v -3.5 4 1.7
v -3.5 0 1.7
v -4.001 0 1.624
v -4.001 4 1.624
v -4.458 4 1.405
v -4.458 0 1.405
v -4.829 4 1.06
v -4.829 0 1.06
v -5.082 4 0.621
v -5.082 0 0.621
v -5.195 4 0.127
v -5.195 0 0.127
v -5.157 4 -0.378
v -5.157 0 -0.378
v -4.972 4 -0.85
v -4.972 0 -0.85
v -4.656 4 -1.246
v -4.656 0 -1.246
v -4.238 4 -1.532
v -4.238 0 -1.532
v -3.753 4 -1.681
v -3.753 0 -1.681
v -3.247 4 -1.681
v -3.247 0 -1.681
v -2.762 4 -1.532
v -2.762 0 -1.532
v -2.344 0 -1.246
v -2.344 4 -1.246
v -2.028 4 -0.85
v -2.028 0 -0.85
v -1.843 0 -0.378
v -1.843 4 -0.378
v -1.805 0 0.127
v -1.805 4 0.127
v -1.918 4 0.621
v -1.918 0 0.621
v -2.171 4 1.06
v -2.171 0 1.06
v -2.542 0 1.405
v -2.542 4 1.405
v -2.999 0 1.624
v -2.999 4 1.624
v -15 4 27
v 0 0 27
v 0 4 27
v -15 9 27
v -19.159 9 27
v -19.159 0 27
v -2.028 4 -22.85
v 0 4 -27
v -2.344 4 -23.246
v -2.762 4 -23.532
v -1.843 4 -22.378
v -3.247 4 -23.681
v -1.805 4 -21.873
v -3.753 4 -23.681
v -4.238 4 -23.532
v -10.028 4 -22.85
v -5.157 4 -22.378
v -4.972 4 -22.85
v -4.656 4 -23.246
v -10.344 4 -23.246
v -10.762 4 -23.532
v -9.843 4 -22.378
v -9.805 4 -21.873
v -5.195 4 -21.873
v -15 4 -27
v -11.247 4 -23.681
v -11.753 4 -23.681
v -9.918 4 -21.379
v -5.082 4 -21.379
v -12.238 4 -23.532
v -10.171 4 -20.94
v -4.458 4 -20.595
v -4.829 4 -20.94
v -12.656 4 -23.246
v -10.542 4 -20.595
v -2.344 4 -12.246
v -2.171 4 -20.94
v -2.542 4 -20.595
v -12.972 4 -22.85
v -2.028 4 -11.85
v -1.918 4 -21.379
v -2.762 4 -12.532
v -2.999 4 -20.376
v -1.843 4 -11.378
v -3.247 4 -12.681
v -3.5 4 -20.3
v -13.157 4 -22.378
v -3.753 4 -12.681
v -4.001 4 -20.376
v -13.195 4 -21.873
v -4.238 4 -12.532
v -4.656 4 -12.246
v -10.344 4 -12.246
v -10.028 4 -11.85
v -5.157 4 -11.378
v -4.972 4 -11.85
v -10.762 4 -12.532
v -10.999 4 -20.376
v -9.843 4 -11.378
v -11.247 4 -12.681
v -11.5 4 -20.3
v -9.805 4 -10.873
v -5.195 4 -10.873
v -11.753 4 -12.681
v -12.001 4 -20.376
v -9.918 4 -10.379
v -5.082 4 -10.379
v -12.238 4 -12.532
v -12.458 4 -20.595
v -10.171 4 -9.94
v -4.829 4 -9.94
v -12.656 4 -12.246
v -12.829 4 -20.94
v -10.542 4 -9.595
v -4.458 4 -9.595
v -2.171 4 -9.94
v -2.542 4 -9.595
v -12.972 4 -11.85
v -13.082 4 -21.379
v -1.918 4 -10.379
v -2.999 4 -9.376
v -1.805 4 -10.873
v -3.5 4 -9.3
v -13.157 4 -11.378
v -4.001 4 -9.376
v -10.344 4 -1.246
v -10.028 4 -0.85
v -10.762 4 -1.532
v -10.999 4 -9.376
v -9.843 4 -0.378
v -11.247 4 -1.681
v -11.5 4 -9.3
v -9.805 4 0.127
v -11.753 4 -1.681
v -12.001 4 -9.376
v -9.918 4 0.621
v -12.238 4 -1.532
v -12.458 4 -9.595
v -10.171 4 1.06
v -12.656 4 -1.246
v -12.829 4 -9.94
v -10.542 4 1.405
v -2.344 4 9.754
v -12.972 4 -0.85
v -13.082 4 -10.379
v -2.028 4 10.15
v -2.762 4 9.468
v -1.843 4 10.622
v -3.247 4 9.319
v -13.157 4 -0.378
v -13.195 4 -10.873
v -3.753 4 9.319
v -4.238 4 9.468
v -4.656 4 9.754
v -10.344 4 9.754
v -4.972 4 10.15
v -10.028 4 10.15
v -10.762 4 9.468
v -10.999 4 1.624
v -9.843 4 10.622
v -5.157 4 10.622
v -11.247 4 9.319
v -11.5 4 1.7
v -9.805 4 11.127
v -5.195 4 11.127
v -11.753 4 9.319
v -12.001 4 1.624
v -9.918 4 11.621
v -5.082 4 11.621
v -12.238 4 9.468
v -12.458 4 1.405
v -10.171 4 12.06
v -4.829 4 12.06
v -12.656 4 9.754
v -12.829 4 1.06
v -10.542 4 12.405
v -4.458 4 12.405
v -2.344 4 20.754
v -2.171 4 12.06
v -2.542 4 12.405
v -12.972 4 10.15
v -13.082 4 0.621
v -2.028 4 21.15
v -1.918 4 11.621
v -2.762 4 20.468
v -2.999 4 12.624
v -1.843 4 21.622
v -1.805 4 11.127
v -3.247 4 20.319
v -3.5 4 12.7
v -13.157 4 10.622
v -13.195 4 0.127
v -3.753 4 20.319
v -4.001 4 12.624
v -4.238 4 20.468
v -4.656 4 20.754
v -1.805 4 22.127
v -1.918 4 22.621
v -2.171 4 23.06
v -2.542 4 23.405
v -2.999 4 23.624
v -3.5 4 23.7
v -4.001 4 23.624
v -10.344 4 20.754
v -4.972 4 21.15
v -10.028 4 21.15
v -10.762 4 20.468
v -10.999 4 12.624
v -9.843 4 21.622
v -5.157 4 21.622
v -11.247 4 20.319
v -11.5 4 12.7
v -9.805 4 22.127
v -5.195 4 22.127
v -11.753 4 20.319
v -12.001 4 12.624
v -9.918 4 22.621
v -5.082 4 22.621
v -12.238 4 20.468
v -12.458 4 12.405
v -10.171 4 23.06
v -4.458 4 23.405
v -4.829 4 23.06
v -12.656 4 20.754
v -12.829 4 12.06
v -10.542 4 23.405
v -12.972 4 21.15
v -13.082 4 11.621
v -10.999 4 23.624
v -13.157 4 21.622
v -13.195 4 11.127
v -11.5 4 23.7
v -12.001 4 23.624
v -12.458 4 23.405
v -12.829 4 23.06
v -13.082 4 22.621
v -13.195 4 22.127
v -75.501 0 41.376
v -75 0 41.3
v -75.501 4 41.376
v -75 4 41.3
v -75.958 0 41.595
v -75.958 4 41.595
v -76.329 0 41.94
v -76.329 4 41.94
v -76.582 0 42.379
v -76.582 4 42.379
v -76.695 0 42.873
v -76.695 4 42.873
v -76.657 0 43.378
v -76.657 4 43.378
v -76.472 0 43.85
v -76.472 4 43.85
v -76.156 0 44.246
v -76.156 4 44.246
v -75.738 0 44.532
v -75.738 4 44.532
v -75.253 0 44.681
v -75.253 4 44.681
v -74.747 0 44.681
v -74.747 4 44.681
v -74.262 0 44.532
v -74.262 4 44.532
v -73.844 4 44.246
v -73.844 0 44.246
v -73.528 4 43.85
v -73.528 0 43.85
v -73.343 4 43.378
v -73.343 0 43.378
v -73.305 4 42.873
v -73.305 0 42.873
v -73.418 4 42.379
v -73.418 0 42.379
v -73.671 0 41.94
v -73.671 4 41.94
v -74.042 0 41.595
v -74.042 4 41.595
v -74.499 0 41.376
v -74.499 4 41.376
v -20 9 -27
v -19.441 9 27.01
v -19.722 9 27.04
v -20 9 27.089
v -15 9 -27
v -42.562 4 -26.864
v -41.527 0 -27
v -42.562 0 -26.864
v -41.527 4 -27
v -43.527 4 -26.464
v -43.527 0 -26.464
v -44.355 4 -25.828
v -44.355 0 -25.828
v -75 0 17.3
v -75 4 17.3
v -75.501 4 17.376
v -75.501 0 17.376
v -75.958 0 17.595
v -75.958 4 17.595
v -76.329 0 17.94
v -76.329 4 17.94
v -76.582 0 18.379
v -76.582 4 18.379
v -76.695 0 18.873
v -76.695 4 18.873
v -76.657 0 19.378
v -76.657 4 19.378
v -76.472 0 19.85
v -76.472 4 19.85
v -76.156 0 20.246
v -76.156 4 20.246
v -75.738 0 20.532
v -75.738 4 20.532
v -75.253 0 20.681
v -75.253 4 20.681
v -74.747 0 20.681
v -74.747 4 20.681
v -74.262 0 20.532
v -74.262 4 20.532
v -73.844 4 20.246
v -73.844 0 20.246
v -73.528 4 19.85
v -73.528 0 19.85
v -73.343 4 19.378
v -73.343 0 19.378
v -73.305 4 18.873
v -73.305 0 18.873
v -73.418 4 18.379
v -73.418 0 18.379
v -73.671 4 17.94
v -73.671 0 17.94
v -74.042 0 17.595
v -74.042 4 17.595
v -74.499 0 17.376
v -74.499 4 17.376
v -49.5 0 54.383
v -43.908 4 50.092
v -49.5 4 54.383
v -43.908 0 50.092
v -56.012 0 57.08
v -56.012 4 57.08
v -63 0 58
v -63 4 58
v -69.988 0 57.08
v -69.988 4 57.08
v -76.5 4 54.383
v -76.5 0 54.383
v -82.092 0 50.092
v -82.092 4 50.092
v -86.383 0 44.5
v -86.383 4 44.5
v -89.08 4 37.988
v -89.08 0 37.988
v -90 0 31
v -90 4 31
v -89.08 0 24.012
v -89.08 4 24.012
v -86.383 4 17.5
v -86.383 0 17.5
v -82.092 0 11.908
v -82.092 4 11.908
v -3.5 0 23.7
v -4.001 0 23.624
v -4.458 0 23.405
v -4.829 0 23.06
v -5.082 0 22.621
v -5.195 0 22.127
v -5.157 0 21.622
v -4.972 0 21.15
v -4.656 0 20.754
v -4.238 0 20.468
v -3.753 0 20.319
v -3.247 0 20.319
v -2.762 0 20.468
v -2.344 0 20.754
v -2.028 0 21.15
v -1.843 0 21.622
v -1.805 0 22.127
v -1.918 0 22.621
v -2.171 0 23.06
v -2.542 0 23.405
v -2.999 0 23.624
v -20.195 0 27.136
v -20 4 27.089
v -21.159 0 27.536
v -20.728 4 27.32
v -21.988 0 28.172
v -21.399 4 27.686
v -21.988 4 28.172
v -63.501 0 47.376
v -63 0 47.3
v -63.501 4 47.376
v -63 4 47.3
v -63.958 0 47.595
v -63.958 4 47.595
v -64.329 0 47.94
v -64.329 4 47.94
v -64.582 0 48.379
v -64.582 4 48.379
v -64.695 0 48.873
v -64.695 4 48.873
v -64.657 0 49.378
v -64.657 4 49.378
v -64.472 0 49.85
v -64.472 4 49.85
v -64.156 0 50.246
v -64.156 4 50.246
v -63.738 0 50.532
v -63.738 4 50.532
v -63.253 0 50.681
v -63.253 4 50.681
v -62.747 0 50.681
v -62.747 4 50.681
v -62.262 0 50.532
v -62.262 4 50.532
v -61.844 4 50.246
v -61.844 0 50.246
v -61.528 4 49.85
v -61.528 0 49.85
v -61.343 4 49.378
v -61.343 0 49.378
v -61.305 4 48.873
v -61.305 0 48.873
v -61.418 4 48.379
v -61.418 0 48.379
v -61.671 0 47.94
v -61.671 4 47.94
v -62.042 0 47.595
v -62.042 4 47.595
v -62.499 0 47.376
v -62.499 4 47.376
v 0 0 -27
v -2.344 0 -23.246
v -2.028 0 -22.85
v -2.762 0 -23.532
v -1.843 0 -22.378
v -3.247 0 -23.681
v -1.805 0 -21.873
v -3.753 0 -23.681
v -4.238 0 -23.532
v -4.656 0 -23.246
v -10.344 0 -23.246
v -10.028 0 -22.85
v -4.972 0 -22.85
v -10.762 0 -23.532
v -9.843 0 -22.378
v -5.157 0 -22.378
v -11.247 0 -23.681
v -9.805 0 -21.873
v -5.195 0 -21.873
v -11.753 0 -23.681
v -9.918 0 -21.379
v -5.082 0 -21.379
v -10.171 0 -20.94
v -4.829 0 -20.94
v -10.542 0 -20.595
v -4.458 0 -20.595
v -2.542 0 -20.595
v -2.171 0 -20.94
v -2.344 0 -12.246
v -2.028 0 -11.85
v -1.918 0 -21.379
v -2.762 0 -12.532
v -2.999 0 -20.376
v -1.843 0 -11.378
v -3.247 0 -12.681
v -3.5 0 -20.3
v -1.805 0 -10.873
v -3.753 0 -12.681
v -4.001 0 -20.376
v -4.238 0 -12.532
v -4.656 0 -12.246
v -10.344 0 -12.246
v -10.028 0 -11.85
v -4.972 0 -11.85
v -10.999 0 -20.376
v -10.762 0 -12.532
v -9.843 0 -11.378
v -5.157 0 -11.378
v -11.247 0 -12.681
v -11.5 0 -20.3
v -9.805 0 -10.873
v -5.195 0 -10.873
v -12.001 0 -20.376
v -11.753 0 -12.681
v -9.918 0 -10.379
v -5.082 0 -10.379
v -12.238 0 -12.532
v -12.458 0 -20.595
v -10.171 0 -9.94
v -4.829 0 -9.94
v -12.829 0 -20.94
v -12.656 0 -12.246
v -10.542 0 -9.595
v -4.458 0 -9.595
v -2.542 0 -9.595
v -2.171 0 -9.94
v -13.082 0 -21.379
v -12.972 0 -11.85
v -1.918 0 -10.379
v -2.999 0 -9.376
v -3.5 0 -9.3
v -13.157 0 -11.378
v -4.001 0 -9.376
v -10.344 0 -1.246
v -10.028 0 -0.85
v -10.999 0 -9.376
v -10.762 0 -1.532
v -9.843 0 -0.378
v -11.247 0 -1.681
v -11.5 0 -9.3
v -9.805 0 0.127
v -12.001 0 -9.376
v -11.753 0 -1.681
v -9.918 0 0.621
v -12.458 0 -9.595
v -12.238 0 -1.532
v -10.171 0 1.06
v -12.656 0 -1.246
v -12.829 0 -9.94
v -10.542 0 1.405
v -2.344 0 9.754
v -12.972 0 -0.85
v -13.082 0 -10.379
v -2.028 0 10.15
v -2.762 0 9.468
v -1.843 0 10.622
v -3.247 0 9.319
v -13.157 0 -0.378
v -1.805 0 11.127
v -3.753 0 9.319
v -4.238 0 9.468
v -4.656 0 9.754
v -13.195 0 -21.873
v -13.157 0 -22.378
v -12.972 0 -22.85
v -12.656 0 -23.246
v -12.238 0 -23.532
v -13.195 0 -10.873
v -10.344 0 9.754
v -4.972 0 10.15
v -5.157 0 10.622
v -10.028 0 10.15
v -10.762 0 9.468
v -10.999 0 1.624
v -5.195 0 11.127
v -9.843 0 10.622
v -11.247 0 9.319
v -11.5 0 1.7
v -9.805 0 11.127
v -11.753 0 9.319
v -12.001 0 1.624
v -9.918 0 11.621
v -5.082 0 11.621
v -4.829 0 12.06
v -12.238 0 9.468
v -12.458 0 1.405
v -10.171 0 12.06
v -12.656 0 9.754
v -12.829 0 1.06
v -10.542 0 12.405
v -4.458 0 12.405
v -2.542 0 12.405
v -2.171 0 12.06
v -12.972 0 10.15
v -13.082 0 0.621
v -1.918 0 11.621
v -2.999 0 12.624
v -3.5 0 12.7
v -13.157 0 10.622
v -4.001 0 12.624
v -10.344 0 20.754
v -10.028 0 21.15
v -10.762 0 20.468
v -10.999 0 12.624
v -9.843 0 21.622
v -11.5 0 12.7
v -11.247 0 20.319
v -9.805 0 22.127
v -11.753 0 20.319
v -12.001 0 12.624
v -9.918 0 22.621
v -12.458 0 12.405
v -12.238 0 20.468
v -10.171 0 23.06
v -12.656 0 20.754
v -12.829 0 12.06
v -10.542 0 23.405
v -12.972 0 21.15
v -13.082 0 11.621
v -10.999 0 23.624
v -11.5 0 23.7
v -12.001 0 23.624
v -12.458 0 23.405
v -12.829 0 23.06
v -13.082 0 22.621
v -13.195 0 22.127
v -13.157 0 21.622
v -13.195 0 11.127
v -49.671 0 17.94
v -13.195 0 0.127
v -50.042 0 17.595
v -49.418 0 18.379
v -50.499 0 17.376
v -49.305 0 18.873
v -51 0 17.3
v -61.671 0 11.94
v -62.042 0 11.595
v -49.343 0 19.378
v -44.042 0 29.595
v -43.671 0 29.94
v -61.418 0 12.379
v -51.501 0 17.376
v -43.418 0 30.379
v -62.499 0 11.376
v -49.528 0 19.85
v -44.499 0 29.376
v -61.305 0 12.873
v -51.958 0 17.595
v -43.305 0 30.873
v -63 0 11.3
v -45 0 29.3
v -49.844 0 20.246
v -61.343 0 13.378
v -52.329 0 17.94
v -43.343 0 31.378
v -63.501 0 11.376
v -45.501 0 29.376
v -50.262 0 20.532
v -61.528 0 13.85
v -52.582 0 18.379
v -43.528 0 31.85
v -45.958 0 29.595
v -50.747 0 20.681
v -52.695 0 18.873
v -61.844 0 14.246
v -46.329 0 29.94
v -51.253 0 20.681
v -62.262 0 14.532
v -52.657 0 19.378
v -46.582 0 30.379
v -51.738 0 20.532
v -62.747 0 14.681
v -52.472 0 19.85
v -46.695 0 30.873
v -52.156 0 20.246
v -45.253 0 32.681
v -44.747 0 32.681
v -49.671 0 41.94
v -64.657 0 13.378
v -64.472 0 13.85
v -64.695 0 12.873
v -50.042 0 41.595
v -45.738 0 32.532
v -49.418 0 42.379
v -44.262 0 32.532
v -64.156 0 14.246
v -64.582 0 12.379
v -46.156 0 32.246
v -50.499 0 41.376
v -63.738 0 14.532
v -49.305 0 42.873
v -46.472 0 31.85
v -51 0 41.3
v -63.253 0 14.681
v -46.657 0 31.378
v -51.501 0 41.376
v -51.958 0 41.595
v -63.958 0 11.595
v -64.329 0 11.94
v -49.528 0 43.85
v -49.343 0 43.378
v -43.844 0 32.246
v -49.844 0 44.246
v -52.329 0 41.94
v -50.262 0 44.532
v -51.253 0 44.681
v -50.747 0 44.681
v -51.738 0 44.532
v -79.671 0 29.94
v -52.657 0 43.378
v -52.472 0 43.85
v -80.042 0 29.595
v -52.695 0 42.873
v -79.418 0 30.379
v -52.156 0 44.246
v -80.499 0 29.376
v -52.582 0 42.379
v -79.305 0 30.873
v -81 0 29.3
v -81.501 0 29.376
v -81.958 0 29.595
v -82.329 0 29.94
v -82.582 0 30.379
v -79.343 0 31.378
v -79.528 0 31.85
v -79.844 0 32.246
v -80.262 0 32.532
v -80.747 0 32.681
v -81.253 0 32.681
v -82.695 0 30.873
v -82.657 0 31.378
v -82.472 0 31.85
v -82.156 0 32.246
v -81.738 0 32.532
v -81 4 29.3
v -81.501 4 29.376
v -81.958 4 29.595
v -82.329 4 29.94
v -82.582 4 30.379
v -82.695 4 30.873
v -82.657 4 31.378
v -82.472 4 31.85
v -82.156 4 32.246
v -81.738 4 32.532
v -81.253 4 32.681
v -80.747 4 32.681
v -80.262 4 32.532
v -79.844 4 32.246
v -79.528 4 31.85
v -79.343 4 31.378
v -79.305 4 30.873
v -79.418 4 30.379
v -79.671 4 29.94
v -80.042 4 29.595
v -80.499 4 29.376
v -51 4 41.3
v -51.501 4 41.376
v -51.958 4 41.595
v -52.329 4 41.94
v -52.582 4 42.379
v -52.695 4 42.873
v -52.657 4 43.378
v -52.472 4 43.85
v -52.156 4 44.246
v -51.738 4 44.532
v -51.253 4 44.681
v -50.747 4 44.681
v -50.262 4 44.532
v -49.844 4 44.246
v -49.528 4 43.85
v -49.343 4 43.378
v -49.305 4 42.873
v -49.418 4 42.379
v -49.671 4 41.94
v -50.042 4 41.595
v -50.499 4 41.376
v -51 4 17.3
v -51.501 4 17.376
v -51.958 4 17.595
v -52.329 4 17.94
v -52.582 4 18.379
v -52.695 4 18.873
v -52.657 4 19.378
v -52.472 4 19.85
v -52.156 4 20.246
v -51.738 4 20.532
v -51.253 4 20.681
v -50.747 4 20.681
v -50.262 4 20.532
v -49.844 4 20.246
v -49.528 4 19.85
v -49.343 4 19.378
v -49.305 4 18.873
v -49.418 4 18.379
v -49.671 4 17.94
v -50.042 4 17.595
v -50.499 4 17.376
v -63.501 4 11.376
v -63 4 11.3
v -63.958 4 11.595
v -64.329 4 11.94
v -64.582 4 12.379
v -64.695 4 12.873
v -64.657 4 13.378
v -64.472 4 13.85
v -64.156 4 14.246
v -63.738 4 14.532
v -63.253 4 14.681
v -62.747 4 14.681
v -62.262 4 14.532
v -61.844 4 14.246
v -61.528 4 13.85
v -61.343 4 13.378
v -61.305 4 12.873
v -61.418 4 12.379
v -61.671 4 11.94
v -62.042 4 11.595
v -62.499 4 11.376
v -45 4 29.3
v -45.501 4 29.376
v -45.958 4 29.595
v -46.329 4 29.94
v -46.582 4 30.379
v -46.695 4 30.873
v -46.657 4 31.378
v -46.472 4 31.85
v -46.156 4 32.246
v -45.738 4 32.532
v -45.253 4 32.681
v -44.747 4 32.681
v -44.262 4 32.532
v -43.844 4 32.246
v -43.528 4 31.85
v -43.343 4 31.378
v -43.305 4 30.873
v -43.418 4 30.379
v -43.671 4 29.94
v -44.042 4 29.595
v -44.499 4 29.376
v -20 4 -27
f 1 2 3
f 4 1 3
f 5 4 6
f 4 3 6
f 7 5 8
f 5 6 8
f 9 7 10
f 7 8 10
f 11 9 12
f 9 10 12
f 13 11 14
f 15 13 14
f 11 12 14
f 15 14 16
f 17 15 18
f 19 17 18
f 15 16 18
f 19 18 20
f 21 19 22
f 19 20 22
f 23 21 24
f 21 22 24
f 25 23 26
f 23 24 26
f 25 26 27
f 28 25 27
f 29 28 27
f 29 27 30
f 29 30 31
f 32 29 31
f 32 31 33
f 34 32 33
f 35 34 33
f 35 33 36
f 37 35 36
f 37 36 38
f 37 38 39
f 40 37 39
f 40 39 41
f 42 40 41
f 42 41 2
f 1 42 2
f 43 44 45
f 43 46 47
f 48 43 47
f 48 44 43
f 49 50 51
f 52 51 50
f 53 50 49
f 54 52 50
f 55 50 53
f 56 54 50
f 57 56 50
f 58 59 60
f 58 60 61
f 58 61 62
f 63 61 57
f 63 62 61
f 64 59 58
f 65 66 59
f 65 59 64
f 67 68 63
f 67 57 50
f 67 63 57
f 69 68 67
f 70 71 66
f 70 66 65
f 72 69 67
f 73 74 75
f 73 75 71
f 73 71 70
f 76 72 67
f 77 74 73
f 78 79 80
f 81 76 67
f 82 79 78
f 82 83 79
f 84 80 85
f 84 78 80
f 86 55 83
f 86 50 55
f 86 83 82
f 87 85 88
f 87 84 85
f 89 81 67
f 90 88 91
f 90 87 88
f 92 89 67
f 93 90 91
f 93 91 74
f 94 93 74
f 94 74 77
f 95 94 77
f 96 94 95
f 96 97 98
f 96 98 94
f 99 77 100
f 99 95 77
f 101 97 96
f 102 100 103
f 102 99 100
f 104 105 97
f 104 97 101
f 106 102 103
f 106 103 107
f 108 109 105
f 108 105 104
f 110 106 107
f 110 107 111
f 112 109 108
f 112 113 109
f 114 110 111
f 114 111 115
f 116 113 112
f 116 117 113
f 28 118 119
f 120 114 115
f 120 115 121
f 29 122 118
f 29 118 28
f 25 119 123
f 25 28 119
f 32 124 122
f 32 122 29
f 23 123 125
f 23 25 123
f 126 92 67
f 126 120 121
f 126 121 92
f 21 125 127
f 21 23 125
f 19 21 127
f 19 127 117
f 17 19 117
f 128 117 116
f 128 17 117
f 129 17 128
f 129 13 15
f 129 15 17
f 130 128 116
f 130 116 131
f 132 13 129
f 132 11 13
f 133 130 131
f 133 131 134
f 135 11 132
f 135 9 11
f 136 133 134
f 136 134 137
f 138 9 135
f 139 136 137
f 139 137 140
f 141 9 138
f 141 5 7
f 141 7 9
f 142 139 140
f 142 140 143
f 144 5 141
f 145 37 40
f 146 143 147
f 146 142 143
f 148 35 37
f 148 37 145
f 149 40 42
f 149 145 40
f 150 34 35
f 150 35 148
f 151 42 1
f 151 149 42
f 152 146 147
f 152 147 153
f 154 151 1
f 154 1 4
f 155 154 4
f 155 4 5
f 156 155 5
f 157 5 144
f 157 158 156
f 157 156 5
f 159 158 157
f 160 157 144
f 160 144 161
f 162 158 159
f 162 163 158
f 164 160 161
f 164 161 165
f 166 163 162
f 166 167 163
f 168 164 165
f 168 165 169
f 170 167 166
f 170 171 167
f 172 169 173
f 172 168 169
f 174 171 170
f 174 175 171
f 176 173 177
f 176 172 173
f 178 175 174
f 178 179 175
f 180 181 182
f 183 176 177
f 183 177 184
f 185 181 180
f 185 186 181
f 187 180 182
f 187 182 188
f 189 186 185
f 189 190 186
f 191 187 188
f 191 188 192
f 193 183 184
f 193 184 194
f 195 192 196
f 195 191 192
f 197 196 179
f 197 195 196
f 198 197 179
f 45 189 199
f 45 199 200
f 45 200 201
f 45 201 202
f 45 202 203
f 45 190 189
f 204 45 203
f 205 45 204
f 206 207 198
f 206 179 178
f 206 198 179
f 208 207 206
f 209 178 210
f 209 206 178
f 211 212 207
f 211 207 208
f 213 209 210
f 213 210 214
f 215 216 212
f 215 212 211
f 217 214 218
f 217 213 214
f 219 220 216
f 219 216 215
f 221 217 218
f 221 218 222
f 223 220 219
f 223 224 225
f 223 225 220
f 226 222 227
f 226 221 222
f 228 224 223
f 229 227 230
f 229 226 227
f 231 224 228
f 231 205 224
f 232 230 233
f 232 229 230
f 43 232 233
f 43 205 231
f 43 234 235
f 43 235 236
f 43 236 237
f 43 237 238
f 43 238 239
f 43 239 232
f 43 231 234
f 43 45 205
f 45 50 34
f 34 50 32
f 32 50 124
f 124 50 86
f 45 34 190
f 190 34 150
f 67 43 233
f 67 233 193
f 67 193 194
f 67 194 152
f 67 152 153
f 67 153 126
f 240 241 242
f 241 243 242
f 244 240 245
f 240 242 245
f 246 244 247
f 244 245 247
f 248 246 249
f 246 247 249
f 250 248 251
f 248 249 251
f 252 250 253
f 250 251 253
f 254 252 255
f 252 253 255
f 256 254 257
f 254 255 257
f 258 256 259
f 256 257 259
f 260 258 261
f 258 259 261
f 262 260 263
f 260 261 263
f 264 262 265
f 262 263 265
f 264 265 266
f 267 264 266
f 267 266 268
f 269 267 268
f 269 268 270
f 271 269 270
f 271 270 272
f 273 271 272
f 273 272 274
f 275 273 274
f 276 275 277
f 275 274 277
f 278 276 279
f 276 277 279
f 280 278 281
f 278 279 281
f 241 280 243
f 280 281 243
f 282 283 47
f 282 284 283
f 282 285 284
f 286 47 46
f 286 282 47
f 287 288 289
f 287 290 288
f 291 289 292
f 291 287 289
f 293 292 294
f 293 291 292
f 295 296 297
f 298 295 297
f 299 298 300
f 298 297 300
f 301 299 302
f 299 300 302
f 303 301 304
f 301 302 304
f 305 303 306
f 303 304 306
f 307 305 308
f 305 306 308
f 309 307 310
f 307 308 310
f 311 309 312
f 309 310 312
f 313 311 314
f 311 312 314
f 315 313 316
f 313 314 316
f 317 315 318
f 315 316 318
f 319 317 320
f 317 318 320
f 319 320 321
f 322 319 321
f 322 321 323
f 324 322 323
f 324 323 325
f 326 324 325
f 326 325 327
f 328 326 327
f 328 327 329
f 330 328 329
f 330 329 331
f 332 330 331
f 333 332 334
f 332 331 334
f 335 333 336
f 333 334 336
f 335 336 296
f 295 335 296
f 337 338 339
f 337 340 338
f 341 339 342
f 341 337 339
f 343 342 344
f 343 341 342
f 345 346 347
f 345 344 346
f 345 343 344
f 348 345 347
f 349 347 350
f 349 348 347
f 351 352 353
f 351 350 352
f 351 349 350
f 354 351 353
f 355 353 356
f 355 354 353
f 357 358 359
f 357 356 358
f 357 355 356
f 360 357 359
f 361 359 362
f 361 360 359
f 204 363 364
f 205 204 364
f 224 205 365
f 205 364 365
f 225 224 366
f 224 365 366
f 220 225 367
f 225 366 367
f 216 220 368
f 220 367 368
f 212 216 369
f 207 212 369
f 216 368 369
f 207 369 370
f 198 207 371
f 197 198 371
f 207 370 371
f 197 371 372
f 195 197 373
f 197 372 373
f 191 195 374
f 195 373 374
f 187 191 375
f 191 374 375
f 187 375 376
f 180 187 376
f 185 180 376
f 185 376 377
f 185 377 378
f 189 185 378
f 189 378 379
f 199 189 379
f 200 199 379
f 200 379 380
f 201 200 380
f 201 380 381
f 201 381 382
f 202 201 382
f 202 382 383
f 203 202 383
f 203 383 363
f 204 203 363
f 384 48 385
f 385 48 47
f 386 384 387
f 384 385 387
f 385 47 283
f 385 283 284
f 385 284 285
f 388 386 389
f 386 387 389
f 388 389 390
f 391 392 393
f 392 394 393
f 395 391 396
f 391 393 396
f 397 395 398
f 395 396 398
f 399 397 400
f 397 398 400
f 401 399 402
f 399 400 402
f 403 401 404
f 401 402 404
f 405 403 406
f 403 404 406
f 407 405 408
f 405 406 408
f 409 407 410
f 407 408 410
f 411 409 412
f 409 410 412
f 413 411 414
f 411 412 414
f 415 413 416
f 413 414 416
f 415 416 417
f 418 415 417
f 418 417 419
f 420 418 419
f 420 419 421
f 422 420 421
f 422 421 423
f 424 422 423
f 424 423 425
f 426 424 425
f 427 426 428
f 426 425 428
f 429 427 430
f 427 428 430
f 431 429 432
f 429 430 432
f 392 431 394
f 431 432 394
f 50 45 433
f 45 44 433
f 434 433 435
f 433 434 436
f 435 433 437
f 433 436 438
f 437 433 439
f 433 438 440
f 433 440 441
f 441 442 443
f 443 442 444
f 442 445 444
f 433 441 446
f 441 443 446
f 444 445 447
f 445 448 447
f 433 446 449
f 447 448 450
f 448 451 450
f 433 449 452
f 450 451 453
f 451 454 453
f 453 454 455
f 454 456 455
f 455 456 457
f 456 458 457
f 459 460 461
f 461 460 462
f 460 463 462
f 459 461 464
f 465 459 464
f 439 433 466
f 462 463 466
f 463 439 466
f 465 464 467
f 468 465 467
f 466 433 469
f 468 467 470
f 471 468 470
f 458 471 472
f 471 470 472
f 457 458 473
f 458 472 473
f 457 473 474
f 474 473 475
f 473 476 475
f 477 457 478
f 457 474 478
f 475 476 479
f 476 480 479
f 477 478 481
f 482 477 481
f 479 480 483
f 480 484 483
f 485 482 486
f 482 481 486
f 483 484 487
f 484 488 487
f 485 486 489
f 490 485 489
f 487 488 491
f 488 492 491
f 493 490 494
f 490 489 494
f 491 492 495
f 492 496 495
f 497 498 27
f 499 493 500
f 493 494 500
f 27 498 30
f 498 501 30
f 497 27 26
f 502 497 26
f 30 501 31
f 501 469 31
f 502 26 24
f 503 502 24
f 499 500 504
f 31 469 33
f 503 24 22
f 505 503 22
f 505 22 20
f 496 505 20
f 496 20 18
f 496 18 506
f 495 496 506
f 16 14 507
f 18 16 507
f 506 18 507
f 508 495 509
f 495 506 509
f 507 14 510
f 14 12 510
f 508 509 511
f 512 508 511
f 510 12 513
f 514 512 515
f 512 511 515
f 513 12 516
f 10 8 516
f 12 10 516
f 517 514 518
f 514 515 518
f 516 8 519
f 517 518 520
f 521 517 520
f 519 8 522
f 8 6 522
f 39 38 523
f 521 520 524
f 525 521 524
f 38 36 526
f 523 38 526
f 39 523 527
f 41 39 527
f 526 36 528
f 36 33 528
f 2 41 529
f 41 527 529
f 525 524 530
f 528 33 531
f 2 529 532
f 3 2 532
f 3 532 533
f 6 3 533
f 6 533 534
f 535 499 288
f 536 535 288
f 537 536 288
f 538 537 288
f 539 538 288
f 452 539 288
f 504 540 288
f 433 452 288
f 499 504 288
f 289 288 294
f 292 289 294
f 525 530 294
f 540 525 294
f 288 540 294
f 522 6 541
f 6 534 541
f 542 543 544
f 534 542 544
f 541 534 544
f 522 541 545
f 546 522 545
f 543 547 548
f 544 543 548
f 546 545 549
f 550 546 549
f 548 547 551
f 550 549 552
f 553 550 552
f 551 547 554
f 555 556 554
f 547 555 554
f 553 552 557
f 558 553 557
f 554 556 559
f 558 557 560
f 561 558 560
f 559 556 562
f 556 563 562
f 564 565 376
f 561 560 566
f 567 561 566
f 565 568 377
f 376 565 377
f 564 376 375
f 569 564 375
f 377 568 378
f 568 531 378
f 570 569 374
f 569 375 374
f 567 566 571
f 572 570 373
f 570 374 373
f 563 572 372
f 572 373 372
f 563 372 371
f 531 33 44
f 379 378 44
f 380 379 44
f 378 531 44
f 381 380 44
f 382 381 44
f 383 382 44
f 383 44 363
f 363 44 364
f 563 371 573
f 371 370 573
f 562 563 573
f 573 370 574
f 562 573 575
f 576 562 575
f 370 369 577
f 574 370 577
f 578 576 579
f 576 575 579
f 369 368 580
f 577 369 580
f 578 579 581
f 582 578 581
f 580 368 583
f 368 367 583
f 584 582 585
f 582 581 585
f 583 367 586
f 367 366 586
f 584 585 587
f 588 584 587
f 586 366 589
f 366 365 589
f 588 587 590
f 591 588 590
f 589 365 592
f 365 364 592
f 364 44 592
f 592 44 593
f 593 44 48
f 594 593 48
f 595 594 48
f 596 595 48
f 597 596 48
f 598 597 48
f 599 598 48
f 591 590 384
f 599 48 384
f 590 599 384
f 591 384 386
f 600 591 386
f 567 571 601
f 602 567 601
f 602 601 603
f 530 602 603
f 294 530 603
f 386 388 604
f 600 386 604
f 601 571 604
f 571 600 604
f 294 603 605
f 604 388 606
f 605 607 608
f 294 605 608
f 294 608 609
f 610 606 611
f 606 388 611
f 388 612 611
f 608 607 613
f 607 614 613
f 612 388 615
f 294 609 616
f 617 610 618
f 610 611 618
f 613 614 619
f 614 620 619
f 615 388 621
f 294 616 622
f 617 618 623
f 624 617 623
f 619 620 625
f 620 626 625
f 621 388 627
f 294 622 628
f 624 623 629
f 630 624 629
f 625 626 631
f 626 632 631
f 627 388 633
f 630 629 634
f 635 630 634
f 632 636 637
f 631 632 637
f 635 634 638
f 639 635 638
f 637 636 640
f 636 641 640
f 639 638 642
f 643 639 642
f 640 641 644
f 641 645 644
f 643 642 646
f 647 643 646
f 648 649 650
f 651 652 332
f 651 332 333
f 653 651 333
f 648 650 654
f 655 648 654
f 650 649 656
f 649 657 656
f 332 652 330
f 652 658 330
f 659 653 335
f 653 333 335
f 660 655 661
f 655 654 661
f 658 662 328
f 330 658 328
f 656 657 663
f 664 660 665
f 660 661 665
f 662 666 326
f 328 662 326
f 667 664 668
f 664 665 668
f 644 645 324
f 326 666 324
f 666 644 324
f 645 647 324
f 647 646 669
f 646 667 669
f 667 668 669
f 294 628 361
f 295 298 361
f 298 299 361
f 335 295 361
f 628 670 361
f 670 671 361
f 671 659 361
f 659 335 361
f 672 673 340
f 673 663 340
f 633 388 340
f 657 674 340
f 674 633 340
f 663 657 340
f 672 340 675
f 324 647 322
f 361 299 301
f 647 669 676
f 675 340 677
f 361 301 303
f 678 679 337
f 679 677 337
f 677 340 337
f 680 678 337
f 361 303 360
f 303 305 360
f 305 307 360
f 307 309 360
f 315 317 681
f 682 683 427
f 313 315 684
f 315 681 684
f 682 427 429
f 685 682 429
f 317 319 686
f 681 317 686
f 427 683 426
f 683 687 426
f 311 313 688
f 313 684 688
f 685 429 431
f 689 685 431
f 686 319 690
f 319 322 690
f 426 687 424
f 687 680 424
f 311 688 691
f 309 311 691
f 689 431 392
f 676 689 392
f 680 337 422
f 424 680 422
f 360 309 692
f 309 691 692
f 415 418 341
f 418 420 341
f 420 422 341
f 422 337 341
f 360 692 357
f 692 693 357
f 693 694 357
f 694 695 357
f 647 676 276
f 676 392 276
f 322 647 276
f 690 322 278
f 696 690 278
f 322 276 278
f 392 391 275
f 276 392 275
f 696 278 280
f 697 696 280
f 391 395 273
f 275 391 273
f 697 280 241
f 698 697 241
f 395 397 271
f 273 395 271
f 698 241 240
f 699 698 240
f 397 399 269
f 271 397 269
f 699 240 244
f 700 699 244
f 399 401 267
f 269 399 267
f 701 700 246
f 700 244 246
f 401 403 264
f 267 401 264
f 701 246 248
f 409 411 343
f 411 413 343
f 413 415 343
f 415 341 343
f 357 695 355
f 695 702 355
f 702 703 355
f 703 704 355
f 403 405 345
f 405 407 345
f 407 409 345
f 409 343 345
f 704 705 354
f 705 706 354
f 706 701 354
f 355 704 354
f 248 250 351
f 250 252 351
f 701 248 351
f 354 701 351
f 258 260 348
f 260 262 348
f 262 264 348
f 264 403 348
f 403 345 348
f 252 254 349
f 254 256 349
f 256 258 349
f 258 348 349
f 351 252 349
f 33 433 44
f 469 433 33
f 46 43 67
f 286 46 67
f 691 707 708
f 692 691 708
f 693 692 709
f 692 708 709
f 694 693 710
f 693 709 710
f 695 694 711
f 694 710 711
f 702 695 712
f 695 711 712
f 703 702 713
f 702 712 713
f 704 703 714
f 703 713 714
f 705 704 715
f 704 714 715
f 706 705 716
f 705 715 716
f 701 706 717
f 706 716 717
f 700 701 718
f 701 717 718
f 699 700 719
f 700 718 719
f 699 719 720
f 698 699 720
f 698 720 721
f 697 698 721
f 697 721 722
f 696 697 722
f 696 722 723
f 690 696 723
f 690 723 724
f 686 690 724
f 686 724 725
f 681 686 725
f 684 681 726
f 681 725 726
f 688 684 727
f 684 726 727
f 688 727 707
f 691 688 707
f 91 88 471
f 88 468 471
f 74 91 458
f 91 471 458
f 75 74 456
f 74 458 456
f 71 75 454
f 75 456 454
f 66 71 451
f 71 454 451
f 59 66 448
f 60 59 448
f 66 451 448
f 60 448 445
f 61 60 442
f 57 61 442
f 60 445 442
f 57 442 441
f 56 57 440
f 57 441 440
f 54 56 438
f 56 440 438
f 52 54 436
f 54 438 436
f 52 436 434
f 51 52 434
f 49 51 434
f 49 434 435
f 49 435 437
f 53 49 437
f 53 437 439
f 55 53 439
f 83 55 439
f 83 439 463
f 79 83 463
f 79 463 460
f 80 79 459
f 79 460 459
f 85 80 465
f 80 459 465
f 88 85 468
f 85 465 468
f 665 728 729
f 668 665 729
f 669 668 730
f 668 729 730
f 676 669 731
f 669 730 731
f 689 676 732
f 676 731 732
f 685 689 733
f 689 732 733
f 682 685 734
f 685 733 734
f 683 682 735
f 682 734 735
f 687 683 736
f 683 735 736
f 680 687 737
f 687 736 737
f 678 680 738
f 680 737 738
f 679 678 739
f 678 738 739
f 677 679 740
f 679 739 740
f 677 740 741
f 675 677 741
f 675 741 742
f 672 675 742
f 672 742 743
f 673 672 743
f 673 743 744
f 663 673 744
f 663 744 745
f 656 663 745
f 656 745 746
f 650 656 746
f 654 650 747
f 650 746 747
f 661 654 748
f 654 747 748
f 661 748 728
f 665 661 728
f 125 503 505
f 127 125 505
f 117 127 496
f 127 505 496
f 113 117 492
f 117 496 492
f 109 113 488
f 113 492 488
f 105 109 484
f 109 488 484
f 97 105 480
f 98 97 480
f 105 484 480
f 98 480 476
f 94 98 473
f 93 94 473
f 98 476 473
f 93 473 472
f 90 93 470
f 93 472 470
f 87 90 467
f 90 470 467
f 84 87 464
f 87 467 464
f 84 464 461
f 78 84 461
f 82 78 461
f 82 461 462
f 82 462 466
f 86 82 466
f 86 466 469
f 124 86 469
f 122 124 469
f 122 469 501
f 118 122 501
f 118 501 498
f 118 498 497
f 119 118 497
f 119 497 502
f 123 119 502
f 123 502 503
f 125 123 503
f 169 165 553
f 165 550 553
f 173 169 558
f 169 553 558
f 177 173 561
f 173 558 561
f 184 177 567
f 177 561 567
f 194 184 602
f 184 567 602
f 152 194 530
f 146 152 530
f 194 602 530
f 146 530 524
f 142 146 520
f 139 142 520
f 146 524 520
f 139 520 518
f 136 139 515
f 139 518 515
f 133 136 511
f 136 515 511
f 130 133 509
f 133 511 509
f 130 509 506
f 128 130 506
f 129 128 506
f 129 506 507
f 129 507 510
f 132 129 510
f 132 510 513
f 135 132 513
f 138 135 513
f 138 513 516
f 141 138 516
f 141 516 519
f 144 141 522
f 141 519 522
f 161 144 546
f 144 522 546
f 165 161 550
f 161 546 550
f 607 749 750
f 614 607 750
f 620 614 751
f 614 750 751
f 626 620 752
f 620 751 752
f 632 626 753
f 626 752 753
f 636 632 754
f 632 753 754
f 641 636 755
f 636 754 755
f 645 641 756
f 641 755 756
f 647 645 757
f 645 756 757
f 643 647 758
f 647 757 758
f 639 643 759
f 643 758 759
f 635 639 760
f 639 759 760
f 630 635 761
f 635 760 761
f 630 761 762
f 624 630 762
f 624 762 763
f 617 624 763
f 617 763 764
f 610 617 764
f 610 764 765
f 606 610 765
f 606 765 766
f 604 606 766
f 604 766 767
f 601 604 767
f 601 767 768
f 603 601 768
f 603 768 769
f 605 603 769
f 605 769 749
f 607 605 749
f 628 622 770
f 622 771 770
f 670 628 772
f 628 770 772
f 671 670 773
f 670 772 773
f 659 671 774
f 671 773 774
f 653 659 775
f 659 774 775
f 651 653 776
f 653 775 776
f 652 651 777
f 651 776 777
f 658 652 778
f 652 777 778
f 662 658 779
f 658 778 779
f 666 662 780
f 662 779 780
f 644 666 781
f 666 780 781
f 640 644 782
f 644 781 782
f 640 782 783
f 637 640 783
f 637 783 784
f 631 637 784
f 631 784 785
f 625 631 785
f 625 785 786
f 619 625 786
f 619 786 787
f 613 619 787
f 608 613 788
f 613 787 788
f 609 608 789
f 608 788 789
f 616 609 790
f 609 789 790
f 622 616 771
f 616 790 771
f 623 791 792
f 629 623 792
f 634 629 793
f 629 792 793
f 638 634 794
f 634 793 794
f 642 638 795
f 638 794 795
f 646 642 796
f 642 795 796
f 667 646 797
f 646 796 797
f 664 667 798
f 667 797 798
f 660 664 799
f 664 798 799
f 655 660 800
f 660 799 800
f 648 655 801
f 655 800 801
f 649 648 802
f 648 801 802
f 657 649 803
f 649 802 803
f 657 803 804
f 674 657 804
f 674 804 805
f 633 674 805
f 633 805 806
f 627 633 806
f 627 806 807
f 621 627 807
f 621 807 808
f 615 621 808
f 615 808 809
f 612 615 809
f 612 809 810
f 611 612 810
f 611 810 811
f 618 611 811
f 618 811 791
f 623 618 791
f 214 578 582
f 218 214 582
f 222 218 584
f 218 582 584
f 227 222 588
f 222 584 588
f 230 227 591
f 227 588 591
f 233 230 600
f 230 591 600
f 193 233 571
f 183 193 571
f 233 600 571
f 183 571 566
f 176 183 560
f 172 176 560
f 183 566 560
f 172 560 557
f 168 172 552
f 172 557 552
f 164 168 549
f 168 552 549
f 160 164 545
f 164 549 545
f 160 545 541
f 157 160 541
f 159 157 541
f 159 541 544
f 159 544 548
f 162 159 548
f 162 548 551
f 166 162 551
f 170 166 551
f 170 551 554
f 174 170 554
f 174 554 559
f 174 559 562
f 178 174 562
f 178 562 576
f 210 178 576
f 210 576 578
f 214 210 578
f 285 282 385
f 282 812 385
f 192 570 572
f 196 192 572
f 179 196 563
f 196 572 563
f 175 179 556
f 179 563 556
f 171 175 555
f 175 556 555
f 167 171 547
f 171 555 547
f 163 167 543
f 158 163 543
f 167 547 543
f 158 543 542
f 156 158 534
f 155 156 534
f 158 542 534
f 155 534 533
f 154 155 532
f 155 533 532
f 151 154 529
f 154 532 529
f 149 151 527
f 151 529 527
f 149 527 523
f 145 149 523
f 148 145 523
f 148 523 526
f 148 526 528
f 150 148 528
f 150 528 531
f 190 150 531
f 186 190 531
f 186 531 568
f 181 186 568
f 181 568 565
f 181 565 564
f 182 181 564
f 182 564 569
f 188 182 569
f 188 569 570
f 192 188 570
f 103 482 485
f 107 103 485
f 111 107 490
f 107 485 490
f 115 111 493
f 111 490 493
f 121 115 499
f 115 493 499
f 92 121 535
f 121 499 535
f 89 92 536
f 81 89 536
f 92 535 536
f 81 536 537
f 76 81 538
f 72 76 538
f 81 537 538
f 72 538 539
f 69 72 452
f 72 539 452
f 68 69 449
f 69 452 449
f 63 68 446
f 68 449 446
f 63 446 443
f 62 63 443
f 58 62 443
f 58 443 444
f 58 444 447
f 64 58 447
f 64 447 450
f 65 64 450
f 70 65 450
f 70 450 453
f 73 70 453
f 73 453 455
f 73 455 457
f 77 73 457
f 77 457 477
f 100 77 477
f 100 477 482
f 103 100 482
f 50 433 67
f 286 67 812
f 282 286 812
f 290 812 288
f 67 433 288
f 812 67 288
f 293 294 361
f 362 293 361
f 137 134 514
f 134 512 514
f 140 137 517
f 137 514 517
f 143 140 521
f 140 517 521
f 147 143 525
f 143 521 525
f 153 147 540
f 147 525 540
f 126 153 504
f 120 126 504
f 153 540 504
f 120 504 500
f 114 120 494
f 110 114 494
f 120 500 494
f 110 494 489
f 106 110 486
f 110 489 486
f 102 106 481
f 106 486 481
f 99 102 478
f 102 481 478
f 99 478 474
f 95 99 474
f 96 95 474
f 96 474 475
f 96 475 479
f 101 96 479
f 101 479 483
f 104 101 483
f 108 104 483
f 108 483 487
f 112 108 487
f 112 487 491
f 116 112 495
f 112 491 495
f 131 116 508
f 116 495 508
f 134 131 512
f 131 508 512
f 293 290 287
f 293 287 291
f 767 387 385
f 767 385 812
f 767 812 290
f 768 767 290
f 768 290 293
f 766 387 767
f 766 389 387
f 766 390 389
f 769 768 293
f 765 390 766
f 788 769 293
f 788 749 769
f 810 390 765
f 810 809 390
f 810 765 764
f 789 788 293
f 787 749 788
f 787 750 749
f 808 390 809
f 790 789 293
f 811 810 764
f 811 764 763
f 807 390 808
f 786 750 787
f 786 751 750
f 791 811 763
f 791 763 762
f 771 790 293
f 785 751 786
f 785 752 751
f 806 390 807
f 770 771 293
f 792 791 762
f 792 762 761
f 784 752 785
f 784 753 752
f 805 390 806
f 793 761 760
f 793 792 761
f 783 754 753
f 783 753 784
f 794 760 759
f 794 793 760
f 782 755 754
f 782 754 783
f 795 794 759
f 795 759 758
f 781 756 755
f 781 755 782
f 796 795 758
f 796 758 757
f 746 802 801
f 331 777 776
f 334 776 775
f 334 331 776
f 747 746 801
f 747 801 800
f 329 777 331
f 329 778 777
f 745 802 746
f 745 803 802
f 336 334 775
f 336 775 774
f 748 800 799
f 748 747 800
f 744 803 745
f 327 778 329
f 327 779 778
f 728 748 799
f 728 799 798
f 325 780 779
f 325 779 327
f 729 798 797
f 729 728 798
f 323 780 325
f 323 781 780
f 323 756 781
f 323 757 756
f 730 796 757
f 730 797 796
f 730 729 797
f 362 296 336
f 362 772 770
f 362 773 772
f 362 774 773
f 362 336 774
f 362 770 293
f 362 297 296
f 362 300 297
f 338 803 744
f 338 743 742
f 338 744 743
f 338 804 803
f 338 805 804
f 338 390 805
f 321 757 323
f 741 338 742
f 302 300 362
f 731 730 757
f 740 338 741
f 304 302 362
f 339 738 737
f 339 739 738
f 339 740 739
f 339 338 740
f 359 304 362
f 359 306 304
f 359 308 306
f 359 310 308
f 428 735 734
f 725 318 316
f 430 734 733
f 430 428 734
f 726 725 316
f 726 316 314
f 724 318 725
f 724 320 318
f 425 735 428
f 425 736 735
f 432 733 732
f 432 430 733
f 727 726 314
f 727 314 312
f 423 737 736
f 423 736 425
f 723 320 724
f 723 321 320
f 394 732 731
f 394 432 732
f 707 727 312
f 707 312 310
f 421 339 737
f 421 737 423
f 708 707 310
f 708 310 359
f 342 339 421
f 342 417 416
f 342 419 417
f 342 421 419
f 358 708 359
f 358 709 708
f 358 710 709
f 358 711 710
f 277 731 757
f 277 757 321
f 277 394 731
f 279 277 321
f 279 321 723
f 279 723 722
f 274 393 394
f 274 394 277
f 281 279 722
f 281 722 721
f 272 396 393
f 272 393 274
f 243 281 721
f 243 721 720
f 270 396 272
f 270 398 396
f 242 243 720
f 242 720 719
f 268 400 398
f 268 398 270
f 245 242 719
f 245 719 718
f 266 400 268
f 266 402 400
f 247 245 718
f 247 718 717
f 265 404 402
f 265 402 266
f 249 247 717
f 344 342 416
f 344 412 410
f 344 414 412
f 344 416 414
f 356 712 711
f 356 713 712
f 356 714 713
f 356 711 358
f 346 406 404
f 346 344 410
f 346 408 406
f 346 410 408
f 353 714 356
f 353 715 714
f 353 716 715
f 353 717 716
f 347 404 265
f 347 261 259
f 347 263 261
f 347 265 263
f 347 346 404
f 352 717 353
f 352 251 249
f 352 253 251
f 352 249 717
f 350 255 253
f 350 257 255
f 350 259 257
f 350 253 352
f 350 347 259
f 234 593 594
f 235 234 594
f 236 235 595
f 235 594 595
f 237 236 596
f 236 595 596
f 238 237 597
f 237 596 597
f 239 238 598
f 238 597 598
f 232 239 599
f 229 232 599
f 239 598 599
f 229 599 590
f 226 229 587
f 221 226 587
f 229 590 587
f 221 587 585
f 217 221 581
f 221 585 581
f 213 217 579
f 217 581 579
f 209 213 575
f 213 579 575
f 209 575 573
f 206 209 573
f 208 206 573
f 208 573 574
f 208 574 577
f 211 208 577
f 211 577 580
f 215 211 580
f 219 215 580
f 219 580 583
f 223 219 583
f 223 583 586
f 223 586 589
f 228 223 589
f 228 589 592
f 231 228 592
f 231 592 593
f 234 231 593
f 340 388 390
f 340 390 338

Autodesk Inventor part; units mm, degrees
ref_plane "YZ Plane" through (0, 0, 0) normal (1, 0, 0) x (0, 1, 0)
ref_plane "XZ Plane" through (0, 0, 0) normal (0, 1, 0) x (-1, 0, 0)
ref_plane "XY Plane" through (0, 0, 0) normal (0, 0, 1) x (1, 0, 0)
sketch "Skizze1" plane through (0, 0, 0) normal (0, 1, 0) x (-1, 0, 0)
  line L0 (0, 27) -> (0, -27)
  line L1 (0, 27) -> (20.8162, 27)
  line L2 (20.8162, 27) -> (43.9081, 50.0919)
  line L3 (0, -27) -> (43.1838, -27)
  line L4 (43.1838, -27) -> (82.0919, 11.9081)
  arc A0 (82.0919, 11.9081) -> (43.9081, 50.0919) centre (63, 31) ccw
  point P0 (0, 0)
  point P1 (0, 0)
  dimension "d43" = 54
  dimension "d44" = 135
  dimension "d46" = 31
  dimension "d47" = 63
  dimension "d48" = 54
extrude "Extrusion1" add sketch "Skizze1" along normal blind 4
sketch "Skizze5" plane through (0, 4, 0) normal (0, 1, 0) x (1, 0, 0)
  line L0 (0, -27) -> (0, 27) projected
  line L1 (0, 27) -> (-43.1838, 27) projected
  line L2 (-43.1838, 27) -> (-82.0919, -11.9081) projected
  arc A0 (-82.0919, -11.9081) -> (-43.9081, -50.0919) centre (-63, -31) ccw projected
  line L3 (-43.9081, -50.0919) -> (-20.8162, -27) projected
  line L4 (-20.8162, -27) -> (0, -27) projected
  line L5 (-20, -27) -> (-15, -27)
  line L6 (-15, -27) -> (-15, 27)
  line L7 (-15, 27) -> (-20, 27)
  line L8 (-20, 27) -> (-20, -27)
  dimension "d49" = 5
  dimension "d50" = 15
extrude "Extrusion4" add sketch "Skizze5" along normal blind 5 contours L4 L8 L1 L6
sketch "Skizze6" plane through (0, 4, 0) normal (0, 1, 0) x (1, 0, 0)
  point P0 (0, 0)
  point P1 (-3.5, 0)
  dimension "d51" = 3.5
hole "Bohrung1" at (-3.5, 4, 0) direction (0, -1, 0) diameter 3.4 end through all clearance for "Inbusschraube ISO 4762" size "M3" standard "ISO"
pattern_linear "Rechteckige Anordnung1" count 5 spacing 11 along (0, 0, -1) count 2 spacing 8 along (-1, 0, 0) of "Bohrung1" first direction both ways yes
sketch "Skizze7" plane through (0, 0, 0) normal (0, -1, 0) x (1, 0, 0)
  line L0 (-51, 43) -> (-75, 43)
  line L1 (-75, 43) -> (-75, 19)
  line L2 (-75, 19) -> (-51, 19)
  line L3 (-51, 19) -> (-51, 43)
  line L4 (-51, 43) -> (-75, 19) construction
  line L5 (-63, 63.2011) -> (-63, 8.0055) construction
  circle A0 centre (-63, 31) radius 18
  line L6 (-63, 26.0548) -> (-63, -18.8231) construction
  line L7 (-38.3888, 31) -> (-81.0377, 31) construction
  arc A1 (-43.9081, 50.0919) -> (-82.0919, 11.9081) centre (-63, 31) ccw projected
  line L8 (-51, 19) -> (-75, 43) construction
  point P0 (-63, 13)
  point P1 (-81, 31)
  point P2 (-63, 13)
  point P3 (-63, 31)
  point P4 (-45, 31)
  point P5 (-63, 49)
  dimension "d32" = 24
  dimension "d33" = 24
  dimension "d35" = 36
hole "Bohrung2" at (-63, 0, 13) at (-81, 0, 31) at (-51, 0, 19) at (-75, 0, 19) at (-75, 0, 43) at (-51, 0, 43) at (-63, 0, 49) at (-45, 0, 31) direction (0, 1, 0) diameter 3.4 end through all clearance for "Inbusschraube ISO 4762" size "M3" standard "ISO"
fillet "Rundung1" radius 4 2 edges at (-43.1838, 2, -27) (-20.8162, 2, 27)
equation "\"d48\" = d43"
properties part number "dynamixel_pro_frame_part3" material "Aluminium 6061"
